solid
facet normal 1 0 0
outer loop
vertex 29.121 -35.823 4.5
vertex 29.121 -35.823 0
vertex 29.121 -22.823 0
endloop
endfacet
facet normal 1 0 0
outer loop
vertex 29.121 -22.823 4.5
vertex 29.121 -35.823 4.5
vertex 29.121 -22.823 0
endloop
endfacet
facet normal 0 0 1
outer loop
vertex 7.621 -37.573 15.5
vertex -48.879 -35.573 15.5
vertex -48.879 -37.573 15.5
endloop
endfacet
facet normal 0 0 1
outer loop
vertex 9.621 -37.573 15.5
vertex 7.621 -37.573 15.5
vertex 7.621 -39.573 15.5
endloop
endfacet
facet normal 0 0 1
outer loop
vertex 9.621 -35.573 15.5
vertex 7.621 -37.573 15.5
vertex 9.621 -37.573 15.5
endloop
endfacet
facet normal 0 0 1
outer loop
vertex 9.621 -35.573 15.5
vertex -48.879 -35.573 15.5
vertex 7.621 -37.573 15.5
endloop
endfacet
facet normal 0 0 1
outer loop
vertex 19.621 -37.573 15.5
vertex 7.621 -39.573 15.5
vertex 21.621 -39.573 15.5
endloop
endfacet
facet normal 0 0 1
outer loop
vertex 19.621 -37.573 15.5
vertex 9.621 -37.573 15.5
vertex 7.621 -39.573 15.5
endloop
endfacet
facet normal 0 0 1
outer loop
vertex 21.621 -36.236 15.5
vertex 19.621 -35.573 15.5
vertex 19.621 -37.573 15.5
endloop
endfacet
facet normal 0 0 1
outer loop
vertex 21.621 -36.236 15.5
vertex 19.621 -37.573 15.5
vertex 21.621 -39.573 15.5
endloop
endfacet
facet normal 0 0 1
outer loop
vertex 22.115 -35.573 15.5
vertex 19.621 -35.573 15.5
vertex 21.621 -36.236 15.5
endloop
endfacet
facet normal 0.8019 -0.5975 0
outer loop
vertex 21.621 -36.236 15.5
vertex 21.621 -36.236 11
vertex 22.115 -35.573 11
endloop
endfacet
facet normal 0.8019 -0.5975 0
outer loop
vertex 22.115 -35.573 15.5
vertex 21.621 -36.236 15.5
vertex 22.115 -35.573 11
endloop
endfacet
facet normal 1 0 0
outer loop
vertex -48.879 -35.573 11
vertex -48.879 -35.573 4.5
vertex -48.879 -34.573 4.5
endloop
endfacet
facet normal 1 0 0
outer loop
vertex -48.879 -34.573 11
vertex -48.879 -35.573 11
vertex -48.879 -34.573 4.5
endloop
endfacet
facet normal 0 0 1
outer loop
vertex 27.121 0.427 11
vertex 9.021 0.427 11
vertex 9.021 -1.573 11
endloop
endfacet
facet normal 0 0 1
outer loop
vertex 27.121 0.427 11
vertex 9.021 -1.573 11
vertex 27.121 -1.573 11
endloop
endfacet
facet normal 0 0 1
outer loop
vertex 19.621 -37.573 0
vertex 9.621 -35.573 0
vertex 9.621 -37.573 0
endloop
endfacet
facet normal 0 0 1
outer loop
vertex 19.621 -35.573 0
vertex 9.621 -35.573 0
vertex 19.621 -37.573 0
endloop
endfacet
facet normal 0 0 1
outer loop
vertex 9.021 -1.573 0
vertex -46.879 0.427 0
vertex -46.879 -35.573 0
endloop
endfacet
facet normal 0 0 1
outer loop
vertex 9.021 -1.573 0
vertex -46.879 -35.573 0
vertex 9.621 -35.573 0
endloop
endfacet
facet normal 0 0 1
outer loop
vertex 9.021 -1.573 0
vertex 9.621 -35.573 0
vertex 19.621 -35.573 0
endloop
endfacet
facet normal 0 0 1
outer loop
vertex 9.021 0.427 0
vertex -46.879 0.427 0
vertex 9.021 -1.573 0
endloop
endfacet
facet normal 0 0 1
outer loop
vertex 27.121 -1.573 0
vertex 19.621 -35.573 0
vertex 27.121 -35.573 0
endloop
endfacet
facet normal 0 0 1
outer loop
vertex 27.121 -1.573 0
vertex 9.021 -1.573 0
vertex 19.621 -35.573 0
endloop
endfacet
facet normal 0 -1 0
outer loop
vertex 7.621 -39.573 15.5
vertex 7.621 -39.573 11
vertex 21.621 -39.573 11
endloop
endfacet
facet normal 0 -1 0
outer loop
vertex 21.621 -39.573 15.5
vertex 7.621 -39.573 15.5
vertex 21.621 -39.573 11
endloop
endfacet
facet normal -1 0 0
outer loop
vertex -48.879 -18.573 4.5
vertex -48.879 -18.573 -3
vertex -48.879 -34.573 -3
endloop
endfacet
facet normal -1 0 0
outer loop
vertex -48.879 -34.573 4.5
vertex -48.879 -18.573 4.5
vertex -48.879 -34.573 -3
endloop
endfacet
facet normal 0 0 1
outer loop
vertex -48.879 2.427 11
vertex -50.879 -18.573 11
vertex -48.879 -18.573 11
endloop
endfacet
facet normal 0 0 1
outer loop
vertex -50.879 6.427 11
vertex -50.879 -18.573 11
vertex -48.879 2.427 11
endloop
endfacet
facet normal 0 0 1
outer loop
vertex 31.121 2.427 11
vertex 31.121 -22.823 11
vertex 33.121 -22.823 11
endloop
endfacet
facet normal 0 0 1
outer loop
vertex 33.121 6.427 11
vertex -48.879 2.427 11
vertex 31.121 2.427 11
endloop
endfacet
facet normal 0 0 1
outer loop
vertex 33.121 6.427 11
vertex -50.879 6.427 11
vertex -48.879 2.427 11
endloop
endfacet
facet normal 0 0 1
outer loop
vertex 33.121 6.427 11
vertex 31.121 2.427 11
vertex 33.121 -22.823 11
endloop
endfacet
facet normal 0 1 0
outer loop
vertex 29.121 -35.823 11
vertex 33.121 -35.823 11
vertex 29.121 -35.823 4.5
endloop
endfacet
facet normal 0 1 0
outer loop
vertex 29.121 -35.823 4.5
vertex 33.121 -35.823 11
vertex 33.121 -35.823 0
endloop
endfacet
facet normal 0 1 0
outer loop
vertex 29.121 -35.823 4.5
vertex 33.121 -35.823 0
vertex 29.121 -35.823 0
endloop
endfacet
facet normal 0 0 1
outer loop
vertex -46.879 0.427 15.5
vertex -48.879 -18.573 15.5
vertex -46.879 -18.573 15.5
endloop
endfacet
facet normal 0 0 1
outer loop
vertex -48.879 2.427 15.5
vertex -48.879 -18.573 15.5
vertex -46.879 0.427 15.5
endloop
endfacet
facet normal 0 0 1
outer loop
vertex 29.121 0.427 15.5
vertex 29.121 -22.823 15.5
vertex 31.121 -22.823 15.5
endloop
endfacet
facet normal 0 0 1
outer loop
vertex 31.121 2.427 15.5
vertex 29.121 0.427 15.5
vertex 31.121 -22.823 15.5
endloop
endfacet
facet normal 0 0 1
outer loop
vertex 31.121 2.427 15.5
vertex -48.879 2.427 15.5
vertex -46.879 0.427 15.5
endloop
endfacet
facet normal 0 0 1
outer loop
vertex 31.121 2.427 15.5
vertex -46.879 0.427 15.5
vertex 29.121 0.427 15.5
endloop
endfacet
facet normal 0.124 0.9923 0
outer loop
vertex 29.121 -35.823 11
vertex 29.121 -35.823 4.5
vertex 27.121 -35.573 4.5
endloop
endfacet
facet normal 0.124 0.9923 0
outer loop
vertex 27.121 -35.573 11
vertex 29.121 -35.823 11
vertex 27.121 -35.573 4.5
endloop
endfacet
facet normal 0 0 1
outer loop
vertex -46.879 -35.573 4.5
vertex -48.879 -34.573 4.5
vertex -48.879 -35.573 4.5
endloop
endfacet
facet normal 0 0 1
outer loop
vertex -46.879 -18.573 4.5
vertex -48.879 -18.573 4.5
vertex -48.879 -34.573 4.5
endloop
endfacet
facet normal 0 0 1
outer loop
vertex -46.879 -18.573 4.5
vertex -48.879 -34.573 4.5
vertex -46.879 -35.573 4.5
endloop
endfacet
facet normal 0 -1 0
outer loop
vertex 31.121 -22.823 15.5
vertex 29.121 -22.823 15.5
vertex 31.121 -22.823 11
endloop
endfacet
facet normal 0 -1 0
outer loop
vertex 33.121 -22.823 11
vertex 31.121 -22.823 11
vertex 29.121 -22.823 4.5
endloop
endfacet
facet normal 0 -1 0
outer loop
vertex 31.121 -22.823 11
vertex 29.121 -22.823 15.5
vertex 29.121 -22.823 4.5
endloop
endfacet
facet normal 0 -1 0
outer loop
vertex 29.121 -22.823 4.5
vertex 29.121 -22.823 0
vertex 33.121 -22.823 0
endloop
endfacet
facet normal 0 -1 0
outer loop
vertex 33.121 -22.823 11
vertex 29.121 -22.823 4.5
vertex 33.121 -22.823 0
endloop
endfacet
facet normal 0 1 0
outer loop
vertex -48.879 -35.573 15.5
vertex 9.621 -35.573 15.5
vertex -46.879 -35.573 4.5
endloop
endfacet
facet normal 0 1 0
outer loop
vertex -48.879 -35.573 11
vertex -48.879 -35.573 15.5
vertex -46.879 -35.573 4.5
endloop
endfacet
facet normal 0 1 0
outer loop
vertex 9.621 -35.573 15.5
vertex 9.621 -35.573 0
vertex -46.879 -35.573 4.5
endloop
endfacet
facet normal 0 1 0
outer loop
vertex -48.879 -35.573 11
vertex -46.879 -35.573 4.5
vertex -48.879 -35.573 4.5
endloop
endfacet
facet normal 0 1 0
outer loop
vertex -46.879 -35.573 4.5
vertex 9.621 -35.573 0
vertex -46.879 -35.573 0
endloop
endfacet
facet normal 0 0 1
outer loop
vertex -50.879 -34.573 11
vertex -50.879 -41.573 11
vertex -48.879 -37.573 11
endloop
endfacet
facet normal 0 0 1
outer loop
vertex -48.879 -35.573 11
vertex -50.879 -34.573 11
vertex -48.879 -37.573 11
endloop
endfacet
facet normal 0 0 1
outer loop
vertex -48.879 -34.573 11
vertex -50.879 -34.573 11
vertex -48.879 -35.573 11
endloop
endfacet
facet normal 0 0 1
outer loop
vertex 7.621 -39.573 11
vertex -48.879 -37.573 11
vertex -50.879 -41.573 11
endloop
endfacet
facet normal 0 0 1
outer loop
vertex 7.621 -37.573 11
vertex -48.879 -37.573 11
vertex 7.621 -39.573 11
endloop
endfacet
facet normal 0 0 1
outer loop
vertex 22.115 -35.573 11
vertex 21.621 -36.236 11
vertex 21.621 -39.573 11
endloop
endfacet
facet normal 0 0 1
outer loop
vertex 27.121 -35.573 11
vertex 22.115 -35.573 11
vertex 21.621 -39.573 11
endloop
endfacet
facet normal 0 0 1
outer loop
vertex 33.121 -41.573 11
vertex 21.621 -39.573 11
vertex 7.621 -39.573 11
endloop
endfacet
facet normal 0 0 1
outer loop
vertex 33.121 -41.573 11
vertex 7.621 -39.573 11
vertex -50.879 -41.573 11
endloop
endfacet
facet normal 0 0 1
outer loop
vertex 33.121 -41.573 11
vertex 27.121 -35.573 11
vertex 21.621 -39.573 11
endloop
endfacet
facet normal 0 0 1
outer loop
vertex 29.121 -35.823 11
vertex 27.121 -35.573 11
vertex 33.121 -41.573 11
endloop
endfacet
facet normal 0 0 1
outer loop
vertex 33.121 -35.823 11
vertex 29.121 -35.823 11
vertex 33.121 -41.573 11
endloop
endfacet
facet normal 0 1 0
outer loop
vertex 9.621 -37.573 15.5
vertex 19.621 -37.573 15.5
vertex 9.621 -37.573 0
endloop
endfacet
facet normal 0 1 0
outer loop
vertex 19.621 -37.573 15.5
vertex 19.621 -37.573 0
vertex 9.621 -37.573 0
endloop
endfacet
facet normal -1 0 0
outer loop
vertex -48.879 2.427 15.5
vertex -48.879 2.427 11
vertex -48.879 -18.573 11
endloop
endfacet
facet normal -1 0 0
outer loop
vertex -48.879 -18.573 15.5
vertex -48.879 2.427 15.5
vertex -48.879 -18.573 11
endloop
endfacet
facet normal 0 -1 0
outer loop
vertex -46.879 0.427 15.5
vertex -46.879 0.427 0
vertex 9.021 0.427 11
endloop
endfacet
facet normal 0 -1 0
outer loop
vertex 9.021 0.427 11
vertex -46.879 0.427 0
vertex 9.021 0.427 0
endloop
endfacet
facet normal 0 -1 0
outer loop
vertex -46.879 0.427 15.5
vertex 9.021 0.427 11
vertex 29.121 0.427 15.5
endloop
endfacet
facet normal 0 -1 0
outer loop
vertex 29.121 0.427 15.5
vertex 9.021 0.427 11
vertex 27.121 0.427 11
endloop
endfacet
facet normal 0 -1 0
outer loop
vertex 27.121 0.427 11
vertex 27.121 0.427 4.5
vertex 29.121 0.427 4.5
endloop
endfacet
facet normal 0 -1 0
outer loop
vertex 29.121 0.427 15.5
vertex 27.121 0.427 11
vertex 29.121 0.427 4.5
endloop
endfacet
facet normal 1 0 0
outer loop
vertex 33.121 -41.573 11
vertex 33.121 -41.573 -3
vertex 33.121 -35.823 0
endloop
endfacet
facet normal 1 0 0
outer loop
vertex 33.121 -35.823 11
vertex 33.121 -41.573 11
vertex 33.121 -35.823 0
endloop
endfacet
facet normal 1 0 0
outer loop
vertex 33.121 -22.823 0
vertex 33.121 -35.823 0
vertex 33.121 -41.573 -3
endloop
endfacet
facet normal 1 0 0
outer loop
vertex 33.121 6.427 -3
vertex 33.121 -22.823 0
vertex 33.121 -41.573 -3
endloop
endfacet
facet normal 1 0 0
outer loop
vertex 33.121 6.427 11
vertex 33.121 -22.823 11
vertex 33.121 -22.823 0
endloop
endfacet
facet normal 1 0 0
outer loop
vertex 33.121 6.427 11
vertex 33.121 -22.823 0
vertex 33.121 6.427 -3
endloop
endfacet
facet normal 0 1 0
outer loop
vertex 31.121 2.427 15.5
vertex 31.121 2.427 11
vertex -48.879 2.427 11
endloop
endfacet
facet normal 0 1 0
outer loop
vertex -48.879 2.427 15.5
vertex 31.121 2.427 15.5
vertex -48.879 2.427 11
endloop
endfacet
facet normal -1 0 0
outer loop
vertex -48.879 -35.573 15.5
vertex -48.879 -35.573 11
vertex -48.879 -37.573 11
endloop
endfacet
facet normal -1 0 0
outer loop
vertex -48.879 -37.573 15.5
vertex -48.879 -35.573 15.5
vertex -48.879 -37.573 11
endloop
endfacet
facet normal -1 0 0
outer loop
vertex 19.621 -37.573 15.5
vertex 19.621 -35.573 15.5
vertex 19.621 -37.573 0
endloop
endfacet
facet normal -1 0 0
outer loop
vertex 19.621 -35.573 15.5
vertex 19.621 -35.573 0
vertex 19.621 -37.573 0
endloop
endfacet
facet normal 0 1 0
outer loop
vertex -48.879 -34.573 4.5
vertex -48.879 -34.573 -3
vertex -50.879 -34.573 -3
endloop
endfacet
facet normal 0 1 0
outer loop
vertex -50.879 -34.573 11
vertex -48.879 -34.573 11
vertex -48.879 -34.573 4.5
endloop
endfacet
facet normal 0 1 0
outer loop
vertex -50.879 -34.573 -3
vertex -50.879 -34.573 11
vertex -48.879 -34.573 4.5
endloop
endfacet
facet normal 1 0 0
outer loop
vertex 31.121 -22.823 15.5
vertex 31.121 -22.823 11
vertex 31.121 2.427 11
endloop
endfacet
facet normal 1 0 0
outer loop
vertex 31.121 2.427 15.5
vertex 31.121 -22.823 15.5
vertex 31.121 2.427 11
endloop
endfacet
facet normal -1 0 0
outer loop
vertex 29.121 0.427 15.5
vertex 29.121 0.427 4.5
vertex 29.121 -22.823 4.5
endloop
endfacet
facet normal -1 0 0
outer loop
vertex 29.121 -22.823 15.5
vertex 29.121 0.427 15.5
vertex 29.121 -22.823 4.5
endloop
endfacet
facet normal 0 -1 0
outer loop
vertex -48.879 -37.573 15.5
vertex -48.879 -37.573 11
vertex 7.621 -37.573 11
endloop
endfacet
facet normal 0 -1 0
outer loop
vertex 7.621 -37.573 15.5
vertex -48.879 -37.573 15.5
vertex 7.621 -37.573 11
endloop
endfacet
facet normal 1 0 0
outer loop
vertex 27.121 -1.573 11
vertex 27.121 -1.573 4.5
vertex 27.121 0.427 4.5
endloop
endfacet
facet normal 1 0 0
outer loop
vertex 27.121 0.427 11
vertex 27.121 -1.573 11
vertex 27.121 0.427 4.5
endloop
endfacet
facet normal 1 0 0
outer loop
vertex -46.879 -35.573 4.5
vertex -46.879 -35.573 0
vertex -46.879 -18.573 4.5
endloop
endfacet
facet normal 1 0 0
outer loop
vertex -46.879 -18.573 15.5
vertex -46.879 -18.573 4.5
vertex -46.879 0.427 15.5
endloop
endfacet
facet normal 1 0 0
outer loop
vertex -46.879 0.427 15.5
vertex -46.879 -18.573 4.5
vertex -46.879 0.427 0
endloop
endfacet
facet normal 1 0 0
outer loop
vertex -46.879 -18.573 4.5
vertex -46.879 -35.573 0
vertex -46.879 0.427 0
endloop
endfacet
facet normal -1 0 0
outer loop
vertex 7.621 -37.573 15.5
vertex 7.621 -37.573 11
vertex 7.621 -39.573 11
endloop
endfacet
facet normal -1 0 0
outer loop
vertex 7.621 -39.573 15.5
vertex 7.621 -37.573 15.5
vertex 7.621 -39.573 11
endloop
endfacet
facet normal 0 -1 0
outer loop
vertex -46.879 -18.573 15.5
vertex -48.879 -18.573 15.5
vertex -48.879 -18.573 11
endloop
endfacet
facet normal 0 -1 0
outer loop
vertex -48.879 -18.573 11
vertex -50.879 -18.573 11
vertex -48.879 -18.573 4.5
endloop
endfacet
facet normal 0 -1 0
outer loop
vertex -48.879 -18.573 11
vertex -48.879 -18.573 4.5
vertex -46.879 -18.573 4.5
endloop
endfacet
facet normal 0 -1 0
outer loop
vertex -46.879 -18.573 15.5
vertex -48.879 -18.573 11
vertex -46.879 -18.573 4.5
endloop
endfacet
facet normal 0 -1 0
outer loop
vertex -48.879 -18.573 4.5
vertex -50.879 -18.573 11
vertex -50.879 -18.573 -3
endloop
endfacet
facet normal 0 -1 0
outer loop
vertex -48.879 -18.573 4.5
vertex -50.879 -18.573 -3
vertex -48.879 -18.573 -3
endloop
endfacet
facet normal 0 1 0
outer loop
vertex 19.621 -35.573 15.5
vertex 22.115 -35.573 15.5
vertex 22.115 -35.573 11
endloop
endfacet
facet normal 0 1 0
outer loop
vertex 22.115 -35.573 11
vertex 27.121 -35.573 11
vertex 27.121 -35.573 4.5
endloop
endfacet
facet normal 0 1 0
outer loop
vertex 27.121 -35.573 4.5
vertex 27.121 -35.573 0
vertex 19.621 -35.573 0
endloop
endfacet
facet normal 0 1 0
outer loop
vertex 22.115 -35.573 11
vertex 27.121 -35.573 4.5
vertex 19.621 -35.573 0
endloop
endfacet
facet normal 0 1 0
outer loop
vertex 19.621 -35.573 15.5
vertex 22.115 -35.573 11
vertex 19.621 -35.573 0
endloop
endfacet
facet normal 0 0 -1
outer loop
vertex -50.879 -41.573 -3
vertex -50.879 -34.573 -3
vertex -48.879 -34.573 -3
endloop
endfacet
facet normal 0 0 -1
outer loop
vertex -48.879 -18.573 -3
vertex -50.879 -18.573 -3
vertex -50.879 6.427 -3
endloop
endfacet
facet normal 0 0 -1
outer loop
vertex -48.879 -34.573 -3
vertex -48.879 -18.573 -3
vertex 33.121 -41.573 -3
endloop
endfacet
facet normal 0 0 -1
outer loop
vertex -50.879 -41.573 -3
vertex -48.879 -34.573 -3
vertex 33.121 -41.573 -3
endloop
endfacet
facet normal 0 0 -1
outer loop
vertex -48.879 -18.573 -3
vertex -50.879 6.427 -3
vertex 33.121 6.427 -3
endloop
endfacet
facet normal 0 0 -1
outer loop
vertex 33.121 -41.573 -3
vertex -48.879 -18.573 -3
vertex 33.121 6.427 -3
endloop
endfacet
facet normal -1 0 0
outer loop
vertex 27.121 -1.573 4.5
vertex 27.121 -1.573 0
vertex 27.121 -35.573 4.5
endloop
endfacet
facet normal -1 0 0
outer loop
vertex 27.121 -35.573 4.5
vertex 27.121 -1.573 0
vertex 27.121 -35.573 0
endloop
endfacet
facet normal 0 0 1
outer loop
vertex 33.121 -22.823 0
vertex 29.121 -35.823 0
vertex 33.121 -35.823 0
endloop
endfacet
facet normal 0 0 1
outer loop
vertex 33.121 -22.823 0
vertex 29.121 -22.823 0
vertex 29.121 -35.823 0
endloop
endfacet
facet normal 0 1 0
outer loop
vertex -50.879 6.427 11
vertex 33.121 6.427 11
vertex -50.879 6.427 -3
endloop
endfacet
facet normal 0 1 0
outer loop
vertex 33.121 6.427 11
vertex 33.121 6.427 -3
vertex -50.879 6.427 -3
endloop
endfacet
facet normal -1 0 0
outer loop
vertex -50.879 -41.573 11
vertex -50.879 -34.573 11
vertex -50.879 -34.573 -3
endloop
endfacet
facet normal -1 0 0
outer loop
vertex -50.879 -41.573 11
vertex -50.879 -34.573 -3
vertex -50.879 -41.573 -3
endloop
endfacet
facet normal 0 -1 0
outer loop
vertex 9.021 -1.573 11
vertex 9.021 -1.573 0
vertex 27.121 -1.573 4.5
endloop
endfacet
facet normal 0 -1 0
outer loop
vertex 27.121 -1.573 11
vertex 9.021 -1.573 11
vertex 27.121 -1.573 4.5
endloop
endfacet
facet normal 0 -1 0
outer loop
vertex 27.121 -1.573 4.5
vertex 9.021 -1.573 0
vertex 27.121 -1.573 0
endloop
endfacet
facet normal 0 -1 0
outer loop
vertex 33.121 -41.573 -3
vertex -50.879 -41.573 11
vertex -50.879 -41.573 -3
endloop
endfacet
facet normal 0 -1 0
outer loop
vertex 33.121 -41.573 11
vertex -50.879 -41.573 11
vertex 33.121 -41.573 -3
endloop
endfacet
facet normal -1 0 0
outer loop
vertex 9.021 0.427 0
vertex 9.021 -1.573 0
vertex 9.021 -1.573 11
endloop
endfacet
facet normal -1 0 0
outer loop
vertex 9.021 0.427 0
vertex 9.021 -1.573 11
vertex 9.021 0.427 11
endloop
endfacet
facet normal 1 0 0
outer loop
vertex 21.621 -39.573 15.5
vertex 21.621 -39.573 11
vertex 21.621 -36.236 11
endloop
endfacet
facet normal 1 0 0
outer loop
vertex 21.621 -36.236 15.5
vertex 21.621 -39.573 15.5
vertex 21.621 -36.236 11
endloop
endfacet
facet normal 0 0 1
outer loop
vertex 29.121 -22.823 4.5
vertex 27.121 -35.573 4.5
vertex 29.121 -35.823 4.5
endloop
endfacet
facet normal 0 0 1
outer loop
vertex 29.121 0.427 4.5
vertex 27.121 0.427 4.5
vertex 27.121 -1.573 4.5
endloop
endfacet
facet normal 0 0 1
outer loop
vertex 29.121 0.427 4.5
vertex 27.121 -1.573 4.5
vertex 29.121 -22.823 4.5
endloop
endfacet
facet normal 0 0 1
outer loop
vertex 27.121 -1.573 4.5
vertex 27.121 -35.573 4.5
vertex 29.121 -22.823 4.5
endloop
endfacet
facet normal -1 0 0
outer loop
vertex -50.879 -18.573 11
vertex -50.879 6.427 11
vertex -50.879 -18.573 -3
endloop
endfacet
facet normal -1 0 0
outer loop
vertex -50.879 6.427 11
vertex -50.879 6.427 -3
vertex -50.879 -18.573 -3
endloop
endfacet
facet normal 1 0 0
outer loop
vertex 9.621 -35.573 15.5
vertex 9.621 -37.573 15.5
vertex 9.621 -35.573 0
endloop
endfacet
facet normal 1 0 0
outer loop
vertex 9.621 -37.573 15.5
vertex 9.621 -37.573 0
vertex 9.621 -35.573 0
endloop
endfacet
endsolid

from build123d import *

# Parameters (mm, degrees)
F0_W     = 2
F0_H     = 19
F0_H_2   = 16
F0_W_2   = 18.0994240791
F0_H_3   = 2
F0_H_4   = 1
F0_H_5   = 23.25
F0_H_6   = 13
F0_H_7   = 6
F0_W_3   = 10
F0_H_8   = 5.75
F1_DEPTH = 3
F2_DEPTH = 4.5
F3_DEPTH = 11
F5_DEPTH = 4.5
F6_DEPTH = 4.5
F7_DEPTH = 4.5


# Not quite as in the source:
# - a feature names something its author has since deleted; it is built from what else it names


with BuildPart() as f1:
    # F0 (on Top) → F1 (new body)
    with BuildSketch(Plane.XY):
        Polygon((-48.8793104887, -18.5732776225), (-48.8793104887, 0.4267223775), (-46.8793104887, 0.4267223775), (9.0212654322, 0.4267223775), (27.1206895113, 0.4267223775), (29.1206895113, 0.4267223775), (29.1206895113, 6.4267223775), (-50.8793104887, 6.4267223775), (-50.8793104887, -1.5732776225), (-50.8793104887, -18.5732776225), align=None)
        with Locations((-47.8793104887, -9.0732776225)):
            Rectangle(F0_W, F0_H)
        Polygon((9.0212654322, 0.4267223775), (-46.8793104887, 0.4267223775), (-46.8793104887, -18.5732776225), (-46.8793104887, -34.5732776225), (-46.8793104887, -35.5732776225), (9.6206895113, -35.5732776225), (19.6206895113, -35.5732776225), (27.1206895113, -35.5732776225), (27.1206895113, -1.5732776225), (9.0212654322, -1.5732776225), align=None)
        with Locations((-47.8793104887, -26.5732776225)):
            Rectangle(F0_W, F0_H_2)
        with Locations((18.0709774718, -0.5732776225)):
            Rectangle(F0_W_2, F0_H_3)
        with Locations((-47.8793104887, -35.0732776225)):
            Rectangle(F0_W, F0_H_4)
        Polygon((-48.8793104887, -35.5732776225), (-48.8793104887, -34.5732776225), (-50.8793104887, -34.5732776225), (-50.8793104887, -35.5732776225), (-50.8793104887, -41.5732776225), (27.1206895113, -41.5732776225), (27.1206895113, -35.5732776225), (19.6206895113, -35.5732776225), (19.6206895113, -37.5732776225), (9.6206895113, -37.5732776225), (9.6206895113, -35.5732776225), (-46.8793104887, -35.5732776225), align=None)
        Polygon((29.1206895113, 0.4267223775), (27.1206895113, 0.4267223775), (27.1206895113, -1.5732776225), (27.1206895113, -35.5732776225), (29.1206895113, -35.8232776225), (29.1206895113, -22.8232776225), align=None)
        with Locations((30.1206895113, -11.1982776225)):
            Rectangle(F0_W, F0_H_5)
        Polygon((29.1206895113, 6.4267223775), (29.1206895113, 0.4267223775), (31.1206895113, 0.4267223775), (31.1206895113, 6.4267223775), (30.1206895113, 6.4267223775), align=None)
        with Locations((30.1206895113, -29.3232776225)):
            Rectangle(F0_W, F0_H_6)
        with Locations((32.1206895113, -11.1982776225)):
            Rectangle(F0_W, F0_H_5)
        with Locations((32.1206895113, 3.4267223775)):
            Rectangle(F0_W, F0_H_7)
        Polygon((29.1206895113, -35.8232776225), (27.1206895113, -35.5732776225), (27.1206895113, -41.5732776225), (29.1206895113, -41.5732776225), align=None)
        with Locations((14.6206895113, -36.5732776225)):
            Rectangle(F0_W_3, F0_H_3)
        Polygon((31.1206895113, -35.8232776225), (29.1206895113, -35.8232776225), (29.1206895113, -41.5732776225), (30.1206895113, -41.5732776225), (31.1206895113, -41.5732776225), align=None)
        with Locations((32.1206895113, -29.3232776225)):
            Rectangle(F0_W, F0_H_6)
        with Locations((32.1206895113, -38.6982776225)):
            Rectangle(F0_W, F0_H_8)
    extrude(amount=-F1_DEPTH)

    # F0 (on Top) → F2 (join)
    with BuildSketch(Plane.XY):
        with Locations((-47.8793104887, -9.0732776225)):
            Rectangle(F0_W, F0_H)
        with Locations((-47.8793104887, -26.5732776225)):
            Rectangle(F0_W, F0_H_2)
        with Locations((18.0709774718, -0.5732776225)):
            Rectangle(F0_W_2, F0_H_3)
        with Locations((-47.8793104887, -35.0732776225)):
            Rectangle(F0_W, F0_H_4)
    extrude(amount=F2_DEPTH)

    # F0 (on Top) → F3 (join)
    with BuildSketch(Plane.XY):
        Polygon((-48.8793104887, -18.5732776225), (-48.8793104887, 0.4267223775), (-46.8793104887, 0.4267223775), (9.0212654322, 0.4267223775), (27.1206895113, 0.4267223775), (29.1206895113, 0.4267223775), (29.1206895113, 6.4267223775), (-50.8793104887, 6.4267223775), (-50.8793104887, -1.5732776225), (-50.8793104887, -18.5732776225), align=None)
        with Locations((-47.8793104887, -9.0732776225)):
            Rectangle(F0_W, F0_H)
        with Locations((18.0709774718, -0.5732776225)):
            Rectangle(F0_W_2, F0_H_3)
        Polygon((-48.8793104887, -35.5732776225), (-48.8793104887, -34.5732776225), (-50.8793104887, -34.5732776225), (-50.8793104887, -35.5732776225), (-50.8793104887, -41.5732776225), (27.1206895113, -41.5732776225), (27.1206895113, -35.5732776225), (19.6206895113, -35.5732776225), (19.6206895113, -37.5732776225), (9.6206895113, -37.5732776225), (9.6206895113, -35.5732776225), (-46.8793104887, -35.5732776225), align=None)
        with Locations((30.1206895113, -11.1982776225)):
            Rectangle(F0_W, F0_H_5)
        Polygon((29.1206895113, 6.4267223775), (29.1206895113, 0.4267223775), (31.1206895113, 0.4267223775), (31.1206895113, 6.4267223775), (30.1206895113, 6.4267223775), align=None)
        with Locations((32.1206895113, -11.1982776225)):
            Rectangle(F0_W, F0_H_5)
        with Locations((32.1206895113, 3.4267223775)):
            Rectangle(F0_W, F0_H_7)
        Polygon((29.1206895113, -35.8232776225), (27.1206895113, -35.5732776225), (27.1206895113, -41.5732776225), (29.1206895113, -41.5732776225), align=None)
        Polygon((31.1206895113, -35.8232776225), (29.1206895113, -35.8232776225), (29.1206895113, -41.5732776225), (30.1206895113, -41.5732776225), (31.1206895113, -41.5732776225), align=None)
        with Locations((32.1206895113, -38.6982776225)):
            Rectangle(F0_W, F0_H_8)
    extrude(amount=F3_DEPTH)

    # F4 (on face) → F5 (join)
    with BuildSketch(Plane.XY.offset(11)):
        Polygon((22.1148194903, -35.5732776225), (19.6206895113, -35.5732776225), (19.6206895113, -37.5732776225), (9.6206895113, -37.5732776225), (9.6206895113, -35.5732776225), (-48.8793104887, -35.5732776225), (-48.8793104887, -37.5732776225), (7.6206895113, -37.5732776225), (7.6206895113, -39.5732776225), (21.6206895113, -39.5732776225), (21.6206895113, -36.236452068), align=None)
    extrude(amount=F5_DEPTH)

    # F0 (on Top) → F6 (join)
    with BuildSketch(Plane.XY):
        Polygon((29.1206895113, 0.4267223775), (27.1206895113, 0.4267223775), (27.1206895113, -1.5732776225), (27.1206895113, -35.5732776225), (29.1206895113, -35.8232776225), (29.1206895113, -22.8232776225), align=None)
    extrude(amount=F6_DEPTH)

    # F4 (on face) → F7 (join)
    with BuildSketch(Plane.XY.offset(11)):
        Polygon((31.1206895113, -22.8232776225), (31.1206895113, 2.4267223775), (29.1206895113, 2.4267223775), (-48.8793104887, 2.4267223775), (-48.8793104887, -18.5732776225), (-46.8793104887, -18.5732776225), (-46.8793104887, 0.4267223775), (29.1206895113, 0.4267223775), (29.1206895113, -22.8232776225), align=None)
    extrude(amount=F7_DEPTH)


solid = f1.part
